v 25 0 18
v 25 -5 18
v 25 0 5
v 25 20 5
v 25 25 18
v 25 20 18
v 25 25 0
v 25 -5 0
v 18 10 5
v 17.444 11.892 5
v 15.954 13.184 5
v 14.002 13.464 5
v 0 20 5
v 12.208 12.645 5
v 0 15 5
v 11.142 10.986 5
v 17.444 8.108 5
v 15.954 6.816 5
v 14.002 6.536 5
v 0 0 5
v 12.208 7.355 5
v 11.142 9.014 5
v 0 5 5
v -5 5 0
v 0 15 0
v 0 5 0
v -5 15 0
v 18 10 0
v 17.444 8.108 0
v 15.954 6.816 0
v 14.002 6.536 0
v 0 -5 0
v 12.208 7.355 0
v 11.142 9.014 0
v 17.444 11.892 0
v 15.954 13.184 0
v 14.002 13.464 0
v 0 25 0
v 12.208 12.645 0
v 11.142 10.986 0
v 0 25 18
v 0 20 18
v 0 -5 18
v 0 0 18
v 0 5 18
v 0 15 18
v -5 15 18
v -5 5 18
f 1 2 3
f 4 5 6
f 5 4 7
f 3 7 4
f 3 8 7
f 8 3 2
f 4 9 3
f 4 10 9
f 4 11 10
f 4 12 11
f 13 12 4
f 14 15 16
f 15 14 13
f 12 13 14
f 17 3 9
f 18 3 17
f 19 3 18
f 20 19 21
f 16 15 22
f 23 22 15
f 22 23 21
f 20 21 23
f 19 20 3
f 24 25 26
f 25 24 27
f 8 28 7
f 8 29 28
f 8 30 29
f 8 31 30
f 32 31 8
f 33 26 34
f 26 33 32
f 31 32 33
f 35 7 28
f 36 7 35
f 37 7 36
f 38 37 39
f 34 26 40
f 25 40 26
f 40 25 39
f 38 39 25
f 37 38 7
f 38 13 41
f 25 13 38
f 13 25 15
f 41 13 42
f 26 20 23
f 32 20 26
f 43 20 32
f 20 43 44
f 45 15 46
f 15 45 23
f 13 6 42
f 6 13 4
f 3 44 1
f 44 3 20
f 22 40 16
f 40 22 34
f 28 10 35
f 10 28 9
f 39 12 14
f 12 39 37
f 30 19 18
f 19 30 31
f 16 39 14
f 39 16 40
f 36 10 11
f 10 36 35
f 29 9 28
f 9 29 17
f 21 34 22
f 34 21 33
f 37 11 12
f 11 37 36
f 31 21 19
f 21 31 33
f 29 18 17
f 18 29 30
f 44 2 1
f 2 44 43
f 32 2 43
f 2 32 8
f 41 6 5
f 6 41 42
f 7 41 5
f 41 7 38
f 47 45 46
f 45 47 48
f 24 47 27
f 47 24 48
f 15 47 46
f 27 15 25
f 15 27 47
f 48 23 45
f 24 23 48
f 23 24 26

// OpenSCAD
depth=25;

width=20;

thickness=5;

wall_thickness=5;

difference(){
  cube(size=[depth, width, thickness]);
  translate([depth/2+2,width/2,0]){
    cylinder(d=7, h=thickness);
  }
}


translate([0,wall_thickness*-1,0]){
  cube(size=[depth, wall_thickness, thickness+13]);
}

translate([0,width,0]){
  cube(size=[depth, wall_thickness, thickness+13]);
}

translate([wall_thickness*-1,5,0]){
  cube(size=[wall_thickness, width/2, thickness+13]);
}
